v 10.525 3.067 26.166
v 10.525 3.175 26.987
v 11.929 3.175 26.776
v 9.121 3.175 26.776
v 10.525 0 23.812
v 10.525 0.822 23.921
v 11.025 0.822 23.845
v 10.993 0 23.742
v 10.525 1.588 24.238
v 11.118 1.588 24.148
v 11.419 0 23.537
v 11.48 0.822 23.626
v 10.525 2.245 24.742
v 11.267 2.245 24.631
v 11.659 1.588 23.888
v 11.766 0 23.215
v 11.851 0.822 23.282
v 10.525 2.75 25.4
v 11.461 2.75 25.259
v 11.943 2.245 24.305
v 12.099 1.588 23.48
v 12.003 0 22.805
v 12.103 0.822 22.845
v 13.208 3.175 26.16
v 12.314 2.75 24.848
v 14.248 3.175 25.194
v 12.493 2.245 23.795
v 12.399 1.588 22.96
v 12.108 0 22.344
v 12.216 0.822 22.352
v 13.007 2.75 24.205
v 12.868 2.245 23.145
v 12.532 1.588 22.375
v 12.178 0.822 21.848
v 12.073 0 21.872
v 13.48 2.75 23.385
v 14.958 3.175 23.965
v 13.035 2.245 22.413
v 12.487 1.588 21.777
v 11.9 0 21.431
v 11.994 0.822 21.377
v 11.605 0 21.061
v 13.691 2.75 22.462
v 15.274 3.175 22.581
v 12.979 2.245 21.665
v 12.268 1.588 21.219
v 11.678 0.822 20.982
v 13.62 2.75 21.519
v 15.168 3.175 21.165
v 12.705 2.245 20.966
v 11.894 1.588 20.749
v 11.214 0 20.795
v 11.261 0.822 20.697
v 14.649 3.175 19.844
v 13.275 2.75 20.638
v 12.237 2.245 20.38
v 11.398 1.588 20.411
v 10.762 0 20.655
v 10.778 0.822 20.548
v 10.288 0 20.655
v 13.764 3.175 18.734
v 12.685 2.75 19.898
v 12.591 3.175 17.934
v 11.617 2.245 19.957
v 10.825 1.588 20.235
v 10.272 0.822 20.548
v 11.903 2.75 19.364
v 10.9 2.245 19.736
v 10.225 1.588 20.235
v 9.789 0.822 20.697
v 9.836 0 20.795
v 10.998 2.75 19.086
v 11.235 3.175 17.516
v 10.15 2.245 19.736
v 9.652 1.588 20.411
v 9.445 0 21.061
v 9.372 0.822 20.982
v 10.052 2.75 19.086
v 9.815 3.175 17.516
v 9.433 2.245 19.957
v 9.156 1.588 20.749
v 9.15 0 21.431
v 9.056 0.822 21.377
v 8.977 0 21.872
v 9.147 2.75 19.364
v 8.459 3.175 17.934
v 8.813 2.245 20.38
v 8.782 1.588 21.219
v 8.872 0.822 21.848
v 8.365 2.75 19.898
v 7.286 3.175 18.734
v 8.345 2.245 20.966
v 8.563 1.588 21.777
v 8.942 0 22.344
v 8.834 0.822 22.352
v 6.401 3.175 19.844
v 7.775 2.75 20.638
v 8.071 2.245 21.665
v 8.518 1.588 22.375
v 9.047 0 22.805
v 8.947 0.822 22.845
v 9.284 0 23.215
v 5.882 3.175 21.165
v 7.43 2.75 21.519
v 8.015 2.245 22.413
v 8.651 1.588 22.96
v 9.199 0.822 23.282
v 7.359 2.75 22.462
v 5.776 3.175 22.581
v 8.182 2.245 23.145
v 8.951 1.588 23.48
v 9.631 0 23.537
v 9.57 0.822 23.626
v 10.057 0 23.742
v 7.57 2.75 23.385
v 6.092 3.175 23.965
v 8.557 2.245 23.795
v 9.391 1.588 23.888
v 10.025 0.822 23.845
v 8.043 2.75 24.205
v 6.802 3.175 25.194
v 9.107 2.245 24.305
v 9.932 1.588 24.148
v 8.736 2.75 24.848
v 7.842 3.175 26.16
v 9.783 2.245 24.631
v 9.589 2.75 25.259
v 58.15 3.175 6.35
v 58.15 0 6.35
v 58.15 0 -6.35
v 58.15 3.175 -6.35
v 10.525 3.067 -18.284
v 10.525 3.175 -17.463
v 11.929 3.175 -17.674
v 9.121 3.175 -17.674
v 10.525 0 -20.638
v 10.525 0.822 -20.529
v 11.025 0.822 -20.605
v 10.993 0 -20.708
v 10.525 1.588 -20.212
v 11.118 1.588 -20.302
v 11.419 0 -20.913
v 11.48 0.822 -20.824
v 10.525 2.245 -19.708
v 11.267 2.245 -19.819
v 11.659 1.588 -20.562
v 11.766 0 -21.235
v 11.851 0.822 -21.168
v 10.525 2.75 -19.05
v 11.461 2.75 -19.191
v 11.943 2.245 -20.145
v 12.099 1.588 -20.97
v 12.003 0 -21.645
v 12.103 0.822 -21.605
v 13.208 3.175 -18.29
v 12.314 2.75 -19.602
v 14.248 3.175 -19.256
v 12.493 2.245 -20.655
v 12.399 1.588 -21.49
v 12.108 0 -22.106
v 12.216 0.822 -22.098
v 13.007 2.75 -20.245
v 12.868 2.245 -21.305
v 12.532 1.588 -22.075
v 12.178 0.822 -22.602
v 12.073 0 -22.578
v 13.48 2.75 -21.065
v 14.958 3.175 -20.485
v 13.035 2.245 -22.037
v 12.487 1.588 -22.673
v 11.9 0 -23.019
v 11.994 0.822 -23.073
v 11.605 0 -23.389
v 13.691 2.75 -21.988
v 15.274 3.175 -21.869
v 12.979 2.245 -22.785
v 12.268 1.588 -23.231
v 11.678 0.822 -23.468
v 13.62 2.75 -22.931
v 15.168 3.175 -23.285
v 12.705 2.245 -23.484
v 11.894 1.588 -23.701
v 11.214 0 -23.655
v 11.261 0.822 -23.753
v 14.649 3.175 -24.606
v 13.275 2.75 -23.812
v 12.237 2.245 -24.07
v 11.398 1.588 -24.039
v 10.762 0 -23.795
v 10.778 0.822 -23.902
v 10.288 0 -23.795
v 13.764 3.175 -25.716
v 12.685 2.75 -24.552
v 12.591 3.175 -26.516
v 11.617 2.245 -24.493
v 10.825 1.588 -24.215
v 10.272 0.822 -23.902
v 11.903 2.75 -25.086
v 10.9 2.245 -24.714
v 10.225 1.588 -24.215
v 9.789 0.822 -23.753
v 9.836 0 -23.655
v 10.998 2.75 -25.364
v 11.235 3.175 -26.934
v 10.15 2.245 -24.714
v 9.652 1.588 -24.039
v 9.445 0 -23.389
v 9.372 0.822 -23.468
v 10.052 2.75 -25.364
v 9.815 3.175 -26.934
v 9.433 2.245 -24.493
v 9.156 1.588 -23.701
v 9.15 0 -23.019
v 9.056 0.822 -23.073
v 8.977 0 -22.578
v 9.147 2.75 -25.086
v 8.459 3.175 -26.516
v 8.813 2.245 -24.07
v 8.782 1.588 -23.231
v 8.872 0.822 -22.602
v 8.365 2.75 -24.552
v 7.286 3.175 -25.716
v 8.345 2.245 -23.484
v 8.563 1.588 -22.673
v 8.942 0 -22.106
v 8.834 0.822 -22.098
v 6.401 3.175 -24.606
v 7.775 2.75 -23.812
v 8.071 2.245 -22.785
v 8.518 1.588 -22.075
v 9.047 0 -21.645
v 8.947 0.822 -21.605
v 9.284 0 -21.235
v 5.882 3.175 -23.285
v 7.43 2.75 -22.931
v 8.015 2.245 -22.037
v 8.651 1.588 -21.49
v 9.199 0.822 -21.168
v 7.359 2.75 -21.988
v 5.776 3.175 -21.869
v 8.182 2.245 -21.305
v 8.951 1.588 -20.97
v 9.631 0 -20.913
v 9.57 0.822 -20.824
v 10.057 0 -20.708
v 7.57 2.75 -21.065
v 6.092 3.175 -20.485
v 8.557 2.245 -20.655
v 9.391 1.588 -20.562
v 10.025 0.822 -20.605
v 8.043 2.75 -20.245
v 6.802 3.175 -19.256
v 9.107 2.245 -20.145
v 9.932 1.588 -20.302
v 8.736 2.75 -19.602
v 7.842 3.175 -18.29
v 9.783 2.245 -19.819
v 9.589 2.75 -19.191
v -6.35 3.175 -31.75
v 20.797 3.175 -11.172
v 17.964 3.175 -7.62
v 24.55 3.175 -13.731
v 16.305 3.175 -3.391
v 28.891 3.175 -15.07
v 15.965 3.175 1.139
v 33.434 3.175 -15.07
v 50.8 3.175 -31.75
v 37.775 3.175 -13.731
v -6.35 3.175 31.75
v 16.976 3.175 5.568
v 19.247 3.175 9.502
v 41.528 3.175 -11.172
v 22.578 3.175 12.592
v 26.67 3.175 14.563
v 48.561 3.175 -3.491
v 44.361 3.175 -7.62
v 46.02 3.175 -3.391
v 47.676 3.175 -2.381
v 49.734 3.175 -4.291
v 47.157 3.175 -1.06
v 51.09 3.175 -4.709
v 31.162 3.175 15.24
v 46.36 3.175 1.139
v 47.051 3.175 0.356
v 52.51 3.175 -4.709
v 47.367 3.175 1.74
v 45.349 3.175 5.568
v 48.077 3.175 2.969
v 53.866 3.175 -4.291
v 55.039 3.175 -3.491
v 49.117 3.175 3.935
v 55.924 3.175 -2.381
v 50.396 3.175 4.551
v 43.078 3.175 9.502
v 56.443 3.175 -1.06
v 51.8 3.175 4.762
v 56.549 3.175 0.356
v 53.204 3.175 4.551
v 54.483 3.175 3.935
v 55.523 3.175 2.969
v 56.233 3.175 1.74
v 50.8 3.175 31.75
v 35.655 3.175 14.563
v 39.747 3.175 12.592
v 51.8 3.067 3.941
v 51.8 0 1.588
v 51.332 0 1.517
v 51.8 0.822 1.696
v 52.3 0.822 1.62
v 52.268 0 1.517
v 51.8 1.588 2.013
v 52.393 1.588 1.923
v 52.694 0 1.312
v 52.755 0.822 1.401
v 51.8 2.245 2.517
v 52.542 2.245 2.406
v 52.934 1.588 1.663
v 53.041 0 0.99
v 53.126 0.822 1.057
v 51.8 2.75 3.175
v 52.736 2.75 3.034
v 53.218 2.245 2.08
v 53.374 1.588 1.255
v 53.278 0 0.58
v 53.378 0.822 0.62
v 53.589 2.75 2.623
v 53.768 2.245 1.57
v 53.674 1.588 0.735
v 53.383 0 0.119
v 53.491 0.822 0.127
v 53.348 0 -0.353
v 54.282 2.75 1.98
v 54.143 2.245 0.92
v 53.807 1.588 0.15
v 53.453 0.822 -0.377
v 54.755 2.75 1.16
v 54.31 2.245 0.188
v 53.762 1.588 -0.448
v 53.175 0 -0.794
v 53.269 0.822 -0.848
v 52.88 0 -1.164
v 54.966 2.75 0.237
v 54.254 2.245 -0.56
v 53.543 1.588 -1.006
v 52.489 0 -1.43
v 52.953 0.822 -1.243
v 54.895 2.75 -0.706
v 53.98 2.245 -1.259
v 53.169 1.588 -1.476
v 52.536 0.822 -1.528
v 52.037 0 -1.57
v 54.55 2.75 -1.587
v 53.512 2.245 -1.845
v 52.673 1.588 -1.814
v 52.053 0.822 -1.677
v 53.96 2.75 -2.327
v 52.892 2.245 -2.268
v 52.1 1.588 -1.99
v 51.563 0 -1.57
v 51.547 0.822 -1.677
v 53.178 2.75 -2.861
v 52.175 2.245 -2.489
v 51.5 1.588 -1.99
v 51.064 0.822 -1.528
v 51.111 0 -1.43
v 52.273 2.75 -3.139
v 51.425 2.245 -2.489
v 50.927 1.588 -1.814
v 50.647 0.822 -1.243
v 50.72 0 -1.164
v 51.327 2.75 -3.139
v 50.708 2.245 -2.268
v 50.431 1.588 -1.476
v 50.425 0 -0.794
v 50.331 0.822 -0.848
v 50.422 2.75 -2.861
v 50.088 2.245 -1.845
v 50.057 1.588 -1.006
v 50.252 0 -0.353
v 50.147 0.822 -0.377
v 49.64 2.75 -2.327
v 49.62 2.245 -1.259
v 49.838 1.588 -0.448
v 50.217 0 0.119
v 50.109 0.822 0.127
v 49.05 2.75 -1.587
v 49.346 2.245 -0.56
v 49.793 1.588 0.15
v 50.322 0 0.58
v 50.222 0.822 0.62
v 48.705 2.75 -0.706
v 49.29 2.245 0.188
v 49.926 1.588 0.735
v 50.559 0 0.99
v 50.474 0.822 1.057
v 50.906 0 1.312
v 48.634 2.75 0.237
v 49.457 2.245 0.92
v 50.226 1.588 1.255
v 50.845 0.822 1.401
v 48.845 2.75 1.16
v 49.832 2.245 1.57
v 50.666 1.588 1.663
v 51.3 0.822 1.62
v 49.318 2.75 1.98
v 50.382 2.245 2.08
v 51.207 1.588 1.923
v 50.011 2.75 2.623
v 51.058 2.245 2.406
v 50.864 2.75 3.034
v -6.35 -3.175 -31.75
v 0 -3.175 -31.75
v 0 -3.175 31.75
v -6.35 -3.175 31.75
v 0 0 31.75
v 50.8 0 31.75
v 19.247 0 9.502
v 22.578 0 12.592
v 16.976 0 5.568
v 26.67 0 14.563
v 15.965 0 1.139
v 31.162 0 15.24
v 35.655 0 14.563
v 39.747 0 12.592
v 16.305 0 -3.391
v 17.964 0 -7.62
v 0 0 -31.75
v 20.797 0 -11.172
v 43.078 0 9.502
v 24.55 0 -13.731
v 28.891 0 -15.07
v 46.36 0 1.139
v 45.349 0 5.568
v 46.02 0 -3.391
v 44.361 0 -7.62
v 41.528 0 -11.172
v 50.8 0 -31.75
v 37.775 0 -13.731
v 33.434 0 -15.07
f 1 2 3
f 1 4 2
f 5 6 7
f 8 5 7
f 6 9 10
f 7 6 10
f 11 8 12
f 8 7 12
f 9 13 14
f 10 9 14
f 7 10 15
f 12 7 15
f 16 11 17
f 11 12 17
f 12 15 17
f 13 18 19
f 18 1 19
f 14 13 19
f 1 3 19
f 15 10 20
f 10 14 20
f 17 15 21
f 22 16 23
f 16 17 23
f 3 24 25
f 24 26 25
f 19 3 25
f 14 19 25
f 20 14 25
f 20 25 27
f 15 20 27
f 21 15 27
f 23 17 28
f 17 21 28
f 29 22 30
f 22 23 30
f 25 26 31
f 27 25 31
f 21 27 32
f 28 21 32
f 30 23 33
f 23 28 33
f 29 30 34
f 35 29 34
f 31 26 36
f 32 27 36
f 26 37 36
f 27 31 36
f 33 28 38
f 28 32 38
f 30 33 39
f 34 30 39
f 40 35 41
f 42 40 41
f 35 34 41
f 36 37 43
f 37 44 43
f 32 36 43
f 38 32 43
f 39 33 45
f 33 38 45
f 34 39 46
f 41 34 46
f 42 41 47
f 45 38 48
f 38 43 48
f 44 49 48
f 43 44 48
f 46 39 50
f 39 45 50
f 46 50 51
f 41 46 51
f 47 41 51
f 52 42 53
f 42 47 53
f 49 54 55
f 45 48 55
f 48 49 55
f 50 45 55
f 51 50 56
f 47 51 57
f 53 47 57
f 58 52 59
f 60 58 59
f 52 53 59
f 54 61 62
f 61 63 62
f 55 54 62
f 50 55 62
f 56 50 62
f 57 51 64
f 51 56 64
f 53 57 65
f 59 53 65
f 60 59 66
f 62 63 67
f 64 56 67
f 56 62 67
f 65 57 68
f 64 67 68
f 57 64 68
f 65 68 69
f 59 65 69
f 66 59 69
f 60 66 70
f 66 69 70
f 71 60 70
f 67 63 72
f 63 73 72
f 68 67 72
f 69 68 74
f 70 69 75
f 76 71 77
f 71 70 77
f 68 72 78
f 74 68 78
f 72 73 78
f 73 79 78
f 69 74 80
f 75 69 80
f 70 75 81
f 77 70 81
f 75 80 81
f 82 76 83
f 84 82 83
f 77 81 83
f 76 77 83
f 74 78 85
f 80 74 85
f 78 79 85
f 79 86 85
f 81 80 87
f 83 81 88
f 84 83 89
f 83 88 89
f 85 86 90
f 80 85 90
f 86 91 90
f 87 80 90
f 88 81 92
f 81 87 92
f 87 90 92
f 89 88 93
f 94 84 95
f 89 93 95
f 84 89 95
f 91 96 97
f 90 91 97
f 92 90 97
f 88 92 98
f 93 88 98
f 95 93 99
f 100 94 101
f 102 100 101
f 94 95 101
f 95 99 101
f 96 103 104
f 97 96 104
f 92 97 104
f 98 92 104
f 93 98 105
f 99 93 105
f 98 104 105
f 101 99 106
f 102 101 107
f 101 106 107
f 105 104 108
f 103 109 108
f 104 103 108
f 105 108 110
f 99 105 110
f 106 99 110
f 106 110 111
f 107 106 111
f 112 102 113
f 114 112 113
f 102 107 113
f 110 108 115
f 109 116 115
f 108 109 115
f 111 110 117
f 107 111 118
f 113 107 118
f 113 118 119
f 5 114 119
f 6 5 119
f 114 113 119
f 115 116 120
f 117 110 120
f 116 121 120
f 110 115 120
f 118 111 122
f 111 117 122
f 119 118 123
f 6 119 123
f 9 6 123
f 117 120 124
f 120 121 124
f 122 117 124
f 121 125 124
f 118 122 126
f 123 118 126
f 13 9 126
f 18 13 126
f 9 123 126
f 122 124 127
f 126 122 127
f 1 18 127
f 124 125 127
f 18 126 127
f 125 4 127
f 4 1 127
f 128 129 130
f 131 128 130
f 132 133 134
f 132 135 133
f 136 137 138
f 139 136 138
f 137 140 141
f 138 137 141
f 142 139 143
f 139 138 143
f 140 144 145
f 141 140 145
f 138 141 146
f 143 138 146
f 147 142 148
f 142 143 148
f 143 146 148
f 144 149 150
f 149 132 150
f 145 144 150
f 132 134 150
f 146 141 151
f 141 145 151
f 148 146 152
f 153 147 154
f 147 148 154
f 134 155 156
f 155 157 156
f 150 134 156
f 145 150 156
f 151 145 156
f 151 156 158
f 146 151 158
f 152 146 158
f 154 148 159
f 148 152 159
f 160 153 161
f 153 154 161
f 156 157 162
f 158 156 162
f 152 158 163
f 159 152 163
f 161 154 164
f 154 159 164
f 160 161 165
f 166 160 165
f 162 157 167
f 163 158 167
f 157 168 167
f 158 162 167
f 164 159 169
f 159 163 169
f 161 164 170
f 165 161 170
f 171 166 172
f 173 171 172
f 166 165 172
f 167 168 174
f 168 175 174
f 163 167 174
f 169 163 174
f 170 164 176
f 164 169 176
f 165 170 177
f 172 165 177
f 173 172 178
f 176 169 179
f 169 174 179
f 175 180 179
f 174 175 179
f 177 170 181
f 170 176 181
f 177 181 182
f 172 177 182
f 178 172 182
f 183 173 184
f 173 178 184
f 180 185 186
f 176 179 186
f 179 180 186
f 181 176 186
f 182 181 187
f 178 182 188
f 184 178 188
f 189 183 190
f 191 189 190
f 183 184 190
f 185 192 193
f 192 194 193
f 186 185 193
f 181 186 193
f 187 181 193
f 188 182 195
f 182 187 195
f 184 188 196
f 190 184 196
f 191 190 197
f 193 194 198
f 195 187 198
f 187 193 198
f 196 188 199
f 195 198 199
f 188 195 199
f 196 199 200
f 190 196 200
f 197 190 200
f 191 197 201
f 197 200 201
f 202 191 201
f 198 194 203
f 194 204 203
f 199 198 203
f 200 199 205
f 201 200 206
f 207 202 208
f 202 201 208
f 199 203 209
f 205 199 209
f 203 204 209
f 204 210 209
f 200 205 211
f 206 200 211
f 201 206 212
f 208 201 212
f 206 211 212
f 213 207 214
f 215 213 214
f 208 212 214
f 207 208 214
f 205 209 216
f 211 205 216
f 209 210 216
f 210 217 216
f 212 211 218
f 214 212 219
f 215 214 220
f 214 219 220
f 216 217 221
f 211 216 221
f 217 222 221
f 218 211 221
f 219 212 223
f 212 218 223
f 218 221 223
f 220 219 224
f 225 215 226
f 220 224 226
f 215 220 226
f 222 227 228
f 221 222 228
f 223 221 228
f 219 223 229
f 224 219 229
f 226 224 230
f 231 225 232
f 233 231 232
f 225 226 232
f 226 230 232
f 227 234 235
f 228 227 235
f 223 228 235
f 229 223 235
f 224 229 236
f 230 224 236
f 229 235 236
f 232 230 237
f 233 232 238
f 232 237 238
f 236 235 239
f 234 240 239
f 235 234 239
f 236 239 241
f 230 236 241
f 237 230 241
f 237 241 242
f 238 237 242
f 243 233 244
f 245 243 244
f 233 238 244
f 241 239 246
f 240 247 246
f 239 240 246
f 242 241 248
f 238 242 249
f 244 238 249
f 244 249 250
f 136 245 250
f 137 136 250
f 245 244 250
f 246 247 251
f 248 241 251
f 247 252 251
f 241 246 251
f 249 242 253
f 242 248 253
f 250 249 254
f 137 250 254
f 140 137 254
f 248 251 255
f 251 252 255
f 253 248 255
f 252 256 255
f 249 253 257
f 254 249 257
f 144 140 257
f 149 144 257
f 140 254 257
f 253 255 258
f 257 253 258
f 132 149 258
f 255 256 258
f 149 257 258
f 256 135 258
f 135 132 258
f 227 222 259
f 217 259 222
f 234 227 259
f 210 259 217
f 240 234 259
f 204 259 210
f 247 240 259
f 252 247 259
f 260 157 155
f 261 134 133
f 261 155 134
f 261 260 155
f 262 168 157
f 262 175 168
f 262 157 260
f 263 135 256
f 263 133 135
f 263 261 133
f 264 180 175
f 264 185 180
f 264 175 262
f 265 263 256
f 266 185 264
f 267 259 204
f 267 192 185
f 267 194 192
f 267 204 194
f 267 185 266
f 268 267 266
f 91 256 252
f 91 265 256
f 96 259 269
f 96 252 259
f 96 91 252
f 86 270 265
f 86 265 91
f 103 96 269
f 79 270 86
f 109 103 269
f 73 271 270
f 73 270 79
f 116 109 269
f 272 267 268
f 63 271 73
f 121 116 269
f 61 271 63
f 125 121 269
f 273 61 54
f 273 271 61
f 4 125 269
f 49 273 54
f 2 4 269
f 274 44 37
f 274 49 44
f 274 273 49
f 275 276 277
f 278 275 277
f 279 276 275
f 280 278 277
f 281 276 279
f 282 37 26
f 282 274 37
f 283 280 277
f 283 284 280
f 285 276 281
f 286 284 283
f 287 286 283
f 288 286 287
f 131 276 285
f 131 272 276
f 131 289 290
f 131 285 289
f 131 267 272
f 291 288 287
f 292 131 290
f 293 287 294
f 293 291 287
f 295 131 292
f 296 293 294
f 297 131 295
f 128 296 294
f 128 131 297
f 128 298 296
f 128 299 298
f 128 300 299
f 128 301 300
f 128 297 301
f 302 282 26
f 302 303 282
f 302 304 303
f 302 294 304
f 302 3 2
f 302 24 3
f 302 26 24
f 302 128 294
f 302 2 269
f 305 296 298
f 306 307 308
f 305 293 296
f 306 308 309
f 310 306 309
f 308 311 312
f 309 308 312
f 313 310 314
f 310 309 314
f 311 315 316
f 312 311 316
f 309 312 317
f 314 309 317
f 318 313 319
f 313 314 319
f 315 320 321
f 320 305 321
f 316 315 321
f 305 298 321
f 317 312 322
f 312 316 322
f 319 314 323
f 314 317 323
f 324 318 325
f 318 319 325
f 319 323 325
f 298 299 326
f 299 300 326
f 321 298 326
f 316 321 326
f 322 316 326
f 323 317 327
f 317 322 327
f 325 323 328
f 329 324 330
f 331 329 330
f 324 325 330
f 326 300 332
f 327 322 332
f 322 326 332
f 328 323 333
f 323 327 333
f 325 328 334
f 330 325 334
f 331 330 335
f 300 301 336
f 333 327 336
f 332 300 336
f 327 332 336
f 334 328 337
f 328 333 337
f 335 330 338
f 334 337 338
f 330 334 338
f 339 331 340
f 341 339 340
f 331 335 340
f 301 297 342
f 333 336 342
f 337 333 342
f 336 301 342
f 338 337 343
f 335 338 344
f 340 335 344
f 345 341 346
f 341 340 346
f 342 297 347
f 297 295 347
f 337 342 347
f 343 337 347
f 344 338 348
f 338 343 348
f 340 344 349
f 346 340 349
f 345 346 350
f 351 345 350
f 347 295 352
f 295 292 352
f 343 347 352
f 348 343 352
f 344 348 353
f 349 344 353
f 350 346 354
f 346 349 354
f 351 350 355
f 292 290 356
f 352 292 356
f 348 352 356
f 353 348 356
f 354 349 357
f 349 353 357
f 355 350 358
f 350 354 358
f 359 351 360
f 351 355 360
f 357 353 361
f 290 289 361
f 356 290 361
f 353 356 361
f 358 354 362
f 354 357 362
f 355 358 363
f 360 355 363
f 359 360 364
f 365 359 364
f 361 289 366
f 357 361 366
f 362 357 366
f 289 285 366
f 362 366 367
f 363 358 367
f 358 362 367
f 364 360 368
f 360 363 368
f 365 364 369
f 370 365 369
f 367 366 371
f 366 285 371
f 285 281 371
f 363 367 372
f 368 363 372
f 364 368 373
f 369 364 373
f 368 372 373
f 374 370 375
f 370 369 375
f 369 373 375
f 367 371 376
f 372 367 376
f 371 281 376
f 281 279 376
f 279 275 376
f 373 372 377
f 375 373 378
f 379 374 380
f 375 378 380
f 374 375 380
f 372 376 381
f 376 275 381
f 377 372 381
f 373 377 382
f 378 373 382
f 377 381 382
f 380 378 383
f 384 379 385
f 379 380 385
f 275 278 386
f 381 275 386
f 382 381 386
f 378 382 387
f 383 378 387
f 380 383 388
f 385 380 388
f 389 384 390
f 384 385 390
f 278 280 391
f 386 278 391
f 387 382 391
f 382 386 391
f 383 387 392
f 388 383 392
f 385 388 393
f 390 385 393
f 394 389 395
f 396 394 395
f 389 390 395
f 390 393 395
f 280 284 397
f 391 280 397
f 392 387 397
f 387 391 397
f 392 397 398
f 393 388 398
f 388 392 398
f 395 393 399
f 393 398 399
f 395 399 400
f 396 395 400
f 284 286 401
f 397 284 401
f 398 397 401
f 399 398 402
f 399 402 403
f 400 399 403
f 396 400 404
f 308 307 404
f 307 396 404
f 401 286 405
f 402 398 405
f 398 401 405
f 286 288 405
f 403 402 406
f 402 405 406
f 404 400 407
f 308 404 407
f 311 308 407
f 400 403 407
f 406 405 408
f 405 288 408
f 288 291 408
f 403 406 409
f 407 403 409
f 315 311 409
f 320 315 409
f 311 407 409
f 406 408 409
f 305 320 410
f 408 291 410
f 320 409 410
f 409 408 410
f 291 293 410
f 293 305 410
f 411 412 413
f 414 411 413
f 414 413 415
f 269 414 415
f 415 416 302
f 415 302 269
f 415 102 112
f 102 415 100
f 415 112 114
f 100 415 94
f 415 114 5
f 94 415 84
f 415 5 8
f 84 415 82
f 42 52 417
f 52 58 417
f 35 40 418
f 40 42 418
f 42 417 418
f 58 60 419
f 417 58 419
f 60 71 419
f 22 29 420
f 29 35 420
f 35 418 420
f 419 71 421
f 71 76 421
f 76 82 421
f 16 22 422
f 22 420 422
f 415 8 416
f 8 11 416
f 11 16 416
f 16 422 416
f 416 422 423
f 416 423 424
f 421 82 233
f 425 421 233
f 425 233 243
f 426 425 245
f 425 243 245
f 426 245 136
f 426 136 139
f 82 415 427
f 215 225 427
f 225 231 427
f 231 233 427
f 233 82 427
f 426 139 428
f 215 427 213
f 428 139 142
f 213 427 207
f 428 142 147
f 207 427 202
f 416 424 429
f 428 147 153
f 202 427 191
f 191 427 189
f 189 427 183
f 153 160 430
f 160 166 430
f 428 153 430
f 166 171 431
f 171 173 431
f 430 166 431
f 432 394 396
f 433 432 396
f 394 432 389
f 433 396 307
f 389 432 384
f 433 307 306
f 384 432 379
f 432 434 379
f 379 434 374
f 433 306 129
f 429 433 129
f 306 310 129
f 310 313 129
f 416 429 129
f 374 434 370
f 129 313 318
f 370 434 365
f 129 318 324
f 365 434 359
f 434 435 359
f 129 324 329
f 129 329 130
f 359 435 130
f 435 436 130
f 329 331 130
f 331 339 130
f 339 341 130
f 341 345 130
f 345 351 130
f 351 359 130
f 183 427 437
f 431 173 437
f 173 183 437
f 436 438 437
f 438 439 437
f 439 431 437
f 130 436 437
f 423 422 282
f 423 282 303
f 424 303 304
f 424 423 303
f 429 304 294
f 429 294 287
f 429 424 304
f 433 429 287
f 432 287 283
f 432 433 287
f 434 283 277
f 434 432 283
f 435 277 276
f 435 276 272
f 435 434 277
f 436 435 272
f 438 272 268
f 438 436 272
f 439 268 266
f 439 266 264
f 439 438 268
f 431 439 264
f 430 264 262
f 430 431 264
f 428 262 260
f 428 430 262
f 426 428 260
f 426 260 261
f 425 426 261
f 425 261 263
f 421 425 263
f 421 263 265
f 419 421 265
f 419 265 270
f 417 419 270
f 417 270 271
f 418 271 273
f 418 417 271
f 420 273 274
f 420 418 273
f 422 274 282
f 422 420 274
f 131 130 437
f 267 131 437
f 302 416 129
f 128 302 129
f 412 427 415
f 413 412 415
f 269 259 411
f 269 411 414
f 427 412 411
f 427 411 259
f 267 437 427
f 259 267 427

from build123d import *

# Parameters (mm, degrees)
SKETCH3_R           = 1.5875
SKETCH3_R_2         = 15.24
BOSS_EXTRUDE1_DEPTH = 3.175
SKETCH4_W           = 63.5
SKETCH4_H           = 6.35
BOSS_EXTRUDE2_DEPTH = 6.35
FILLET1_R           = 3.175


with BuildPart() as part:
    # Sketch3 → Boss-Extrude1 (new body)
    with BuildSketch(Plane(origin=(0, 0, 0), x_dir=(1, 0, 0), z_dir=(0, 1, 0))):
        Polygon((0, 31.75), (0, -31.75), (50.8, -31.75), (58.15, -6.35), (58.15, 6.35), (50.8, 31.75), align=None)
        with Locations(Location((51.8, 0, 0), (0, 0, 270))):
            Circle(SKETCH3_R, mode=Mode.SUBTRACT)
        with Locations(Location((10.525, 22.225, 0), (0, 0, 270))):
            Circle(SKETCH3_R, mode=Mode.SUBTRACT)
        with Locations(Location((10.525, -22.225, 0), (0, 0, 270))):
            Circle(SKETCH3_R, mode=Mode.SUBTRACT)
        with Locations(Location((31.1625, 0, 0), (0, 0, 270))):
            Circle(SKETCH3_R_2, mode=Mode.SUBTRACT)
    extrude(amount=BOSS_EXTRUDE1_DEPTH)

    # Sketch4 → Boss-Extrude2 (add)
    with BuildSketch(Plane.ZY):
        Rectangle(SKETCH4_W, SKETCH4_H)
    extrude(amount=BOSS_EXTRUDE2_DEPTH)

    # Fillet1
    fillet1_edges = [part.edges().sort_by_distance(p)[0] for p in [
        (10.525, 3.175, -23.8125),
        (10.525, 3.175, 20.6375),
        (51.8, 3.175, -1.5875),
    ]]
    fillet(fillet1_edges, radius=FILLET1_R - 0.0001)  # a hair under: the kernel refuses the full size


solid = part.part
